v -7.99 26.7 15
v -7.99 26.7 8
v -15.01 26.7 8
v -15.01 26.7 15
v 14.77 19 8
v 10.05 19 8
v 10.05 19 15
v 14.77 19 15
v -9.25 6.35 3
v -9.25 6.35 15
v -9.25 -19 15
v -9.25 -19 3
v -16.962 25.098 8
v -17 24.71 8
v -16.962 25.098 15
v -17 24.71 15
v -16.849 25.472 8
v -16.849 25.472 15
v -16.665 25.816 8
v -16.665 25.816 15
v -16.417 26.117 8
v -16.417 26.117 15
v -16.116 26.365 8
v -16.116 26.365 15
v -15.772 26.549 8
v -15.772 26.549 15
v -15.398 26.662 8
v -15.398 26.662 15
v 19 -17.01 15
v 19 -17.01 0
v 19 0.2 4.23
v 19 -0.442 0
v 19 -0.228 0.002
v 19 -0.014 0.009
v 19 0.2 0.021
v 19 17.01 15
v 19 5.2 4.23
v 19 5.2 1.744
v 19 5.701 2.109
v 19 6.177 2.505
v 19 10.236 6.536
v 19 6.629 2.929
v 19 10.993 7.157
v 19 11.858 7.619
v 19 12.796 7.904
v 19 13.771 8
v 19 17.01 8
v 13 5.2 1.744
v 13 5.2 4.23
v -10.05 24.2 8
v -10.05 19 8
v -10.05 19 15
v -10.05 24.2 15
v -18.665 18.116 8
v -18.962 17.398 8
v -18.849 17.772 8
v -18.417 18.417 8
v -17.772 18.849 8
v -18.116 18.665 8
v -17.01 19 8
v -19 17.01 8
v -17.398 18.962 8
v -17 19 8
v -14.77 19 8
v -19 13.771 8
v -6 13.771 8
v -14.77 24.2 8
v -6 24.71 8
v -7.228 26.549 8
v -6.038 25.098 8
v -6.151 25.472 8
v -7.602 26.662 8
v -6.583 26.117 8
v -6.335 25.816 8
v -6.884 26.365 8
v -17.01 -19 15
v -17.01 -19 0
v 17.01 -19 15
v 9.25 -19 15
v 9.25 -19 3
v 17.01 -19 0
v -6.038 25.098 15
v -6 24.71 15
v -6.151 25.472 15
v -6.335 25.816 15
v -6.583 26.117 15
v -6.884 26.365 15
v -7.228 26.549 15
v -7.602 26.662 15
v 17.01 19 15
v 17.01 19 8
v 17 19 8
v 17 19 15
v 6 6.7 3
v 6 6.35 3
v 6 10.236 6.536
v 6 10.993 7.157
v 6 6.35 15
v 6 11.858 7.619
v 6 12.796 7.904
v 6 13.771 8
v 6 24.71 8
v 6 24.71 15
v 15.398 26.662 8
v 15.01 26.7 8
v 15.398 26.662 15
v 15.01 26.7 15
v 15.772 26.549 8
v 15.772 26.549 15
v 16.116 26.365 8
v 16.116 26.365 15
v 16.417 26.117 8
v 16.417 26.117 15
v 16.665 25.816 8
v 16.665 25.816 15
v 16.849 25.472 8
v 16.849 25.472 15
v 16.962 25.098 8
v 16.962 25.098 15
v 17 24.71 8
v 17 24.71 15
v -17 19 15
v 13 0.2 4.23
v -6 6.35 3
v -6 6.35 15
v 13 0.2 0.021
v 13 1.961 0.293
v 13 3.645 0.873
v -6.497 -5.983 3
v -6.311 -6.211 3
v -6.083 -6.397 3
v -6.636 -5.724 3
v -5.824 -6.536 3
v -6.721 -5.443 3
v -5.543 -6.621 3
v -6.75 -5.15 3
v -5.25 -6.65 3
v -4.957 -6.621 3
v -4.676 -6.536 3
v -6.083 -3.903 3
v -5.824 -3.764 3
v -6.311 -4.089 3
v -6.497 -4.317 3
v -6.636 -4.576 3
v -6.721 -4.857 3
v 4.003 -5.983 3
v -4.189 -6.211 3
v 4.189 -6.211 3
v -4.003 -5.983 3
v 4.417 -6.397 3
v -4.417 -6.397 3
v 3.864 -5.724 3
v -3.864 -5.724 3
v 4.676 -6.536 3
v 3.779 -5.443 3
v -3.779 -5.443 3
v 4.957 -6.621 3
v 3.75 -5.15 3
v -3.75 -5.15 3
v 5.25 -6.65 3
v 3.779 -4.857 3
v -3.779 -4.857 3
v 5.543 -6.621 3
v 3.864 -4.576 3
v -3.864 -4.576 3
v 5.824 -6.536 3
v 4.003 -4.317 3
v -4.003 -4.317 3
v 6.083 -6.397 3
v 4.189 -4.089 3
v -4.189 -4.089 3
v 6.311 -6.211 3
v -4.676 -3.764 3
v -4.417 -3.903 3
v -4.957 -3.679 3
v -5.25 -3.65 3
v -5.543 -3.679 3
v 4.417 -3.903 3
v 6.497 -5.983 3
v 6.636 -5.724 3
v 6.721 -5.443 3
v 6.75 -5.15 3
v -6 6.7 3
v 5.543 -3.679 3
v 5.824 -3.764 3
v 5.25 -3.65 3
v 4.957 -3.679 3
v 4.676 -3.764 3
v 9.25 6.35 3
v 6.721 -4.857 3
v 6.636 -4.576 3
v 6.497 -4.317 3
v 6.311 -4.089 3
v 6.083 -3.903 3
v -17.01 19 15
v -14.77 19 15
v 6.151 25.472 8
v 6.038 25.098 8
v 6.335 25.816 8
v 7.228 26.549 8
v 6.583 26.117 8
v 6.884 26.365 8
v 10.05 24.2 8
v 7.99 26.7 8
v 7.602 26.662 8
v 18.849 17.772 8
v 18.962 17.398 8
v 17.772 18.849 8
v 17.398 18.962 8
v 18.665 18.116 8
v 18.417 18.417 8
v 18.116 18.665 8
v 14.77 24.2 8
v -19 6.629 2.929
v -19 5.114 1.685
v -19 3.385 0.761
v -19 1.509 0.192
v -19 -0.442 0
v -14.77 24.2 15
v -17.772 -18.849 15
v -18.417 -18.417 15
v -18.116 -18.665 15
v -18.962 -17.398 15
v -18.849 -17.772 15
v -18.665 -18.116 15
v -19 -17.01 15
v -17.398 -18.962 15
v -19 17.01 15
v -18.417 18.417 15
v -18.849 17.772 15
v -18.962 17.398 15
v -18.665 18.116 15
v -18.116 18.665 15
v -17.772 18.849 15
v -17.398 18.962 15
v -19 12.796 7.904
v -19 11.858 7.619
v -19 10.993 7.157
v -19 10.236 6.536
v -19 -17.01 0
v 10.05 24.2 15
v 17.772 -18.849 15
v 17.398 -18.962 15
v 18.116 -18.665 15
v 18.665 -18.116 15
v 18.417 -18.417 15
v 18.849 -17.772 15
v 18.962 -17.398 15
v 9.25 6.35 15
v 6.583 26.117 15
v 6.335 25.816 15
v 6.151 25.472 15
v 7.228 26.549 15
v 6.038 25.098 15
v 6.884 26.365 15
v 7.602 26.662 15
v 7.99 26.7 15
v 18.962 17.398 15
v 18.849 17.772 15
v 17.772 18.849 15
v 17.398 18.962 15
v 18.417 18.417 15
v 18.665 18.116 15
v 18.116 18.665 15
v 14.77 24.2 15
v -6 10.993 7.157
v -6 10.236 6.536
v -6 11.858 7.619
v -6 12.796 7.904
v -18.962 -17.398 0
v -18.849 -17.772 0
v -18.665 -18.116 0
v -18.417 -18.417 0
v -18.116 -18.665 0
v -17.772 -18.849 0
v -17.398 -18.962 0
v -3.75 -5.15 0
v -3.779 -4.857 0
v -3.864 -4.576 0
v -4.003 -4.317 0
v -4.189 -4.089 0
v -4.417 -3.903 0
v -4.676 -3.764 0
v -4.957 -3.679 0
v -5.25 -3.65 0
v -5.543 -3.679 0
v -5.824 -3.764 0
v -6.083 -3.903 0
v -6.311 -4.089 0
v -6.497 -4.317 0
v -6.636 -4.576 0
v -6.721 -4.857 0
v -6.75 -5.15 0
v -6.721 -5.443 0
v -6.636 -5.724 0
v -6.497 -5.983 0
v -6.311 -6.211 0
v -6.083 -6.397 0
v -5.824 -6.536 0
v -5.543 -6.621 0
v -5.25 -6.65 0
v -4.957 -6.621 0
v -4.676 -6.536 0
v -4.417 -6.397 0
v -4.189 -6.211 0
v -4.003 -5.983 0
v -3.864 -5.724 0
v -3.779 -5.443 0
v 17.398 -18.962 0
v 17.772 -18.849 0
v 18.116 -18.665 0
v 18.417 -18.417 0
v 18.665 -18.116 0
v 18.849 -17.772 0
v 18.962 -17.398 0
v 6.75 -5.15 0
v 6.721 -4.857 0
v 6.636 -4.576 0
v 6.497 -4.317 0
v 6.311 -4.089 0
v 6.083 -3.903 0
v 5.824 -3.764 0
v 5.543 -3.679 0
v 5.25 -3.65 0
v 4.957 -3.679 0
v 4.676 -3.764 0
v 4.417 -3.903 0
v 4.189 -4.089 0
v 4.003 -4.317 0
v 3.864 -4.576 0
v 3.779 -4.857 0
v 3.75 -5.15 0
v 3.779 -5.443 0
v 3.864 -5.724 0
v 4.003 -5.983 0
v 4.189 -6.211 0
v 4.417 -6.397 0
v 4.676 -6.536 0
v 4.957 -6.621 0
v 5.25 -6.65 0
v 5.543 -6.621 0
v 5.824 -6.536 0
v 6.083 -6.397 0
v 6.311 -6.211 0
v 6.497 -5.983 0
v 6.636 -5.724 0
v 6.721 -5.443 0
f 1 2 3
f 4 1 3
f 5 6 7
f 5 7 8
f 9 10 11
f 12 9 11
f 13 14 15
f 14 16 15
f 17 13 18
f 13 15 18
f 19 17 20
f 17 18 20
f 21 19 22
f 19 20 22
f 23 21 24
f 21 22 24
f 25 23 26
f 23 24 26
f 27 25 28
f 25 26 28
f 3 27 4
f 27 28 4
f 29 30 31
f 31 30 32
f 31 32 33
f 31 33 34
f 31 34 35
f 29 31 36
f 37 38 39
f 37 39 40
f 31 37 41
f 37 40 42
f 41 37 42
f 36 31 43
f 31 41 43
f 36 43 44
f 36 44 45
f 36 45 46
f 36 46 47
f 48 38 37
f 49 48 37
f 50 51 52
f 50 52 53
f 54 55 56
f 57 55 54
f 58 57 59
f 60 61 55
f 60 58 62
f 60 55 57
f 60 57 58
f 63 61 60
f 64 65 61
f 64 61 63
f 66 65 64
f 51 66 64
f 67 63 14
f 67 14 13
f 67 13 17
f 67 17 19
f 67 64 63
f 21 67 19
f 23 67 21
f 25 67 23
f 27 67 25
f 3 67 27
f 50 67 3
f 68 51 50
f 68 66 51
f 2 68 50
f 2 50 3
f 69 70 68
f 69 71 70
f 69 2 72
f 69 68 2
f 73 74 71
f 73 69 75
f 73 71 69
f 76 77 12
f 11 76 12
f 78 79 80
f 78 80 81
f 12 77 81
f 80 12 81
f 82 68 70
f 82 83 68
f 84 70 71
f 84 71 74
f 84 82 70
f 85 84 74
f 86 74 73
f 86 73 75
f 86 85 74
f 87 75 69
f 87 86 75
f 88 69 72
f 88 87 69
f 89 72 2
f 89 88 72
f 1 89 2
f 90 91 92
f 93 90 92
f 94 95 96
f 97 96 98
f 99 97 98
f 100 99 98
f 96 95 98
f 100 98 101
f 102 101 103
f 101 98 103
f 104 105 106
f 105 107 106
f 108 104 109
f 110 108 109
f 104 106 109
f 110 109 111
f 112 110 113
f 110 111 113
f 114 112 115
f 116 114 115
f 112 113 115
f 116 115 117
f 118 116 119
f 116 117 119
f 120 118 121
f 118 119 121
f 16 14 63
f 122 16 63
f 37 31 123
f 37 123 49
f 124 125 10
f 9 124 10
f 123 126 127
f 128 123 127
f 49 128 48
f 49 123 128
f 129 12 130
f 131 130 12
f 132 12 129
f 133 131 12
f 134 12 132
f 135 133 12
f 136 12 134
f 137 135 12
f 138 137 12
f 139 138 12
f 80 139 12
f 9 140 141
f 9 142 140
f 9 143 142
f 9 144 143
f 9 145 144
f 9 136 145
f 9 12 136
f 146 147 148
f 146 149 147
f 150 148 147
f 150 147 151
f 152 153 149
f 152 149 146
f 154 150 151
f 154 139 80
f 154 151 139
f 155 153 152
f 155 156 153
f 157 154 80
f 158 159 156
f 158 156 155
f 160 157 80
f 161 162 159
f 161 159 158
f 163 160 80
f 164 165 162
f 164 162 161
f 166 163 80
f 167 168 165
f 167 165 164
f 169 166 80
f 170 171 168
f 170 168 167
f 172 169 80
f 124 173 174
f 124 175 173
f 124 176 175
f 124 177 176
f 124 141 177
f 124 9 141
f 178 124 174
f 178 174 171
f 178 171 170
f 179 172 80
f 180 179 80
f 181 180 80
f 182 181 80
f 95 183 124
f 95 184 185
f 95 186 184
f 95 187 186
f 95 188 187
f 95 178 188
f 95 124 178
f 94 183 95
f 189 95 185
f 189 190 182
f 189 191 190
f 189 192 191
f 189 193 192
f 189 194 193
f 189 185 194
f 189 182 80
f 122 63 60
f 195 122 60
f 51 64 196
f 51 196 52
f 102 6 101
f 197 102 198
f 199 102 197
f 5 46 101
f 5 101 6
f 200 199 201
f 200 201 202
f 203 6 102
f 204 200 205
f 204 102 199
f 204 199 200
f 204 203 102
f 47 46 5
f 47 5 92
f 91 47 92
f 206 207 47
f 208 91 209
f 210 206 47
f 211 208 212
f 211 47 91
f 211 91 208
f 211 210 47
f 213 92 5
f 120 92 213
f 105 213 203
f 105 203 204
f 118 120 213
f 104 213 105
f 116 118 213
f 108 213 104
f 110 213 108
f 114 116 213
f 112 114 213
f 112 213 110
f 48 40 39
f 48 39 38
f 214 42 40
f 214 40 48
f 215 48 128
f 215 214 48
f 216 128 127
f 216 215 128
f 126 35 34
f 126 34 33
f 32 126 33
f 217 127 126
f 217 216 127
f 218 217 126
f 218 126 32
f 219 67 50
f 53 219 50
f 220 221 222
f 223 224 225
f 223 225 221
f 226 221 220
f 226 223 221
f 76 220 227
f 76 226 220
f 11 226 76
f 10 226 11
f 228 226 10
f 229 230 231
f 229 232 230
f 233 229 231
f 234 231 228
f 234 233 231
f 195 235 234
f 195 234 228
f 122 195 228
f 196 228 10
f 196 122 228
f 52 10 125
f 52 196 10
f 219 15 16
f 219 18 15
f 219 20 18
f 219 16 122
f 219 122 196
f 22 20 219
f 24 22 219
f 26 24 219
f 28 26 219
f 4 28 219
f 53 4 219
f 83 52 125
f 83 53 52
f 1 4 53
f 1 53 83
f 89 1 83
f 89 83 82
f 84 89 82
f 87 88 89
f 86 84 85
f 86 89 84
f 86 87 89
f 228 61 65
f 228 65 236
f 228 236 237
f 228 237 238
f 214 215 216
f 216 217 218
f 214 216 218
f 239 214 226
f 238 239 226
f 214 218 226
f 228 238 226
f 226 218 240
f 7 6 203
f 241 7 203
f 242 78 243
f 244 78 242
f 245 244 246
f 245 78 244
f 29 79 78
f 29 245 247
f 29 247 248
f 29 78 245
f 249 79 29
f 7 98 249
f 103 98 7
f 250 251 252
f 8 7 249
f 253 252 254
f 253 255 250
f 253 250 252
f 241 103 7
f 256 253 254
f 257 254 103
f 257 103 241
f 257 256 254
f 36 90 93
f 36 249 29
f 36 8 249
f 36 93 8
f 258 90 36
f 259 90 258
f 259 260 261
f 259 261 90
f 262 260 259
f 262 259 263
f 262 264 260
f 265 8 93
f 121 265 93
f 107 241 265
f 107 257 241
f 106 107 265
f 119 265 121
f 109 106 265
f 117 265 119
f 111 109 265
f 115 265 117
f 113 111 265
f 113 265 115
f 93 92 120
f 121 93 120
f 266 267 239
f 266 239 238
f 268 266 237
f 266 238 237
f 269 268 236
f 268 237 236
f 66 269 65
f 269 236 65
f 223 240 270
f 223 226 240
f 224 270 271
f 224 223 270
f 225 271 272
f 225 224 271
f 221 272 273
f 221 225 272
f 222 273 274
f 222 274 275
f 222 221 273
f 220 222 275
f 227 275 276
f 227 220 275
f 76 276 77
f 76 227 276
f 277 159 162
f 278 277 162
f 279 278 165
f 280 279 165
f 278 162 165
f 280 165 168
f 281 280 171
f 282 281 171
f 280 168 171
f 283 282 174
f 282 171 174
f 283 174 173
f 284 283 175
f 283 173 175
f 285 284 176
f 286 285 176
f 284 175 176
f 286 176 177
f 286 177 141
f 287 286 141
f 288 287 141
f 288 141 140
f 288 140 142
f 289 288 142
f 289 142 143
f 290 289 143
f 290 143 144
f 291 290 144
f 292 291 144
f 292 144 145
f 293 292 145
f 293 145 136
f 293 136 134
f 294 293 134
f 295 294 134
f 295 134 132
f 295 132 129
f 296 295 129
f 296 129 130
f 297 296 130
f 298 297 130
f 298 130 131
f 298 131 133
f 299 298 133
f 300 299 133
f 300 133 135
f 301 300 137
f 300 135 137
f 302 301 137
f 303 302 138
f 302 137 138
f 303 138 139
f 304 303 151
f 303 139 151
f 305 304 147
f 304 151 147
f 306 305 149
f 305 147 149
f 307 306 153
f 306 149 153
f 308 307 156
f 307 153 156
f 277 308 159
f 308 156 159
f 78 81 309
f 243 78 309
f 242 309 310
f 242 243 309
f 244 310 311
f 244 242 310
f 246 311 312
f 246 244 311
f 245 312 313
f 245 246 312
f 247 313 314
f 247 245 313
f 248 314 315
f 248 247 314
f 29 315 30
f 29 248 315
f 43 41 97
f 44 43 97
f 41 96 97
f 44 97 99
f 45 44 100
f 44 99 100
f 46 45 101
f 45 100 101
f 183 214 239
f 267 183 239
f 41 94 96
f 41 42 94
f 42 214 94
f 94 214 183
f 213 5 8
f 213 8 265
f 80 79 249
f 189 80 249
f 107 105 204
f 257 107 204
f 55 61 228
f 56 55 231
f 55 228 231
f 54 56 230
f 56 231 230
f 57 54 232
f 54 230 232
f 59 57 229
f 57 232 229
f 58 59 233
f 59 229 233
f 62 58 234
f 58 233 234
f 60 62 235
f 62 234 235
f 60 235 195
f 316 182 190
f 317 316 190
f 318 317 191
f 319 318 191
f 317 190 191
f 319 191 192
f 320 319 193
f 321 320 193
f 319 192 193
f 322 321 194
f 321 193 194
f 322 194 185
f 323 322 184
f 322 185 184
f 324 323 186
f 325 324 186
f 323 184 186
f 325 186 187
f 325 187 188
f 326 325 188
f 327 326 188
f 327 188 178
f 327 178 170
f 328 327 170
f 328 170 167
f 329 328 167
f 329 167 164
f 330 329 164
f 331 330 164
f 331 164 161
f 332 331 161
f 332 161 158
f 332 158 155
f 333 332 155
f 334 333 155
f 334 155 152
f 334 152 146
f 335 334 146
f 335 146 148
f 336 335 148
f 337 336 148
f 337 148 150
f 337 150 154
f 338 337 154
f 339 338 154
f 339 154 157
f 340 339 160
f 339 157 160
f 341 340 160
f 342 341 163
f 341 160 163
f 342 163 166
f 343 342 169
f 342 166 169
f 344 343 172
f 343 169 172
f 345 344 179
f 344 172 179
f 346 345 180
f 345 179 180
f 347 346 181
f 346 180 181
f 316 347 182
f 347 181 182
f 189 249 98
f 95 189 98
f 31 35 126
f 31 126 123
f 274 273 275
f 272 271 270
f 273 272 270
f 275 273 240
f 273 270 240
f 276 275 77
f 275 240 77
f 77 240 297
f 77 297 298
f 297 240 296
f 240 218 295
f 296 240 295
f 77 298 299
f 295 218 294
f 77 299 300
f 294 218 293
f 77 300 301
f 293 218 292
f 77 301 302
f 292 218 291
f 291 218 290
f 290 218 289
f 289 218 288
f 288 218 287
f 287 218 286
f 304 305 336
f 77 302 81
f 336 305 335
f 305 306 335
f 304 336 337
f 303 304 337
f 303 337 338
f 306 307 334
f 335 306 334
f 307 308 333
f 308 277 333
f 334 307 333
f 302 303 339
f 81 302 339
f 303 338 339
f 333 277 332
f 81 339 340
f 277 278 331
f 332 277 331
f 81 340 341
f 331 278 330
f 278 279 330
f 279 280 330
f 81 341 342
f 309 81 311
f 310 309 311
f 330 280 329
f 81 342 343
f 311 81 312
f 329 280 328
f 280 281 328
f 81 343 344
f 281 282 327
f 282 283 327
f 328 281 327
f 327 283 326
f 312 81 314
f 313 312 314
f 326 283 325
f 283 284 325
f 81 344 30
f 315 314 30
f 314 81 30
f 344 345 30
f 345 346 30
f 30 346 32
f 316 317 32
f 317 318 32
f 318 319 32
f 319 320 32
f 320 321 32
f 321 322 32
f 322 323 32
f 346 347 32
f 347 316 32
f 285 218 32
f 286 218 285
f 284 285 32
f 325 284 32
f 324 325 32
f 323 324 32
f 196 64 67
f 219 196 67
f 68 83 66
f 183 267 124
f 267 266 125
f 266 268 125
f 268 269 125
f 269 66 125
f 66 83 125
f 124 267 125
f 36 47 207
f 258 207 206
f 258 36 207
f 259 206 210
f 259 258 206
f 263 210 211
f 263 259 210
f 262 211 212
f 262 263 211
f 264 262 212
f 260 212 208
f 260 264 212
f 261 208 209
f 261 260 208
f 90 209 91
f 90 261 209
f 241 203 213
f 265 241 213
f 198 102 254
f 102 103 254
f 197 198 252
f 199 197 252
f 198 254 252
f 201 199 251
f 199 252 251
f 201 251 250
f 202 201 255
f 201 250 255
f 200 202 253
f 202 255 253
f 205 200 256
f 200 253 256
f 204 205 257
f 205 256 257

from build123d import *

# Parameters (mm, degrees)
SKETCH_W        = 4.72
SKETCH_H        = 5.2
PAD_DEPTH       = 15
POCKET_DEPTH    = 38.001
POCKET005_DEPTH = 12
SKETCH003_R     = 1.5
POCKET006_DEPTH = 5
FILLET_R        = 1.99
FILLET001_R     = 10
FILLET002_R     = 5
SKETCH004_W     = 5
SKETCH004_H     = 4.23039
POCKET007_DEPTH = 6


with BuildPart() as part:
    # Sketch → Pad (new body)
    with BuildSketch(Plane.XY):
        Polygon((-19, 19), (-19, -19), (19, -19), (19, 19), (17, 19), (17, 26.7), (6, 26.7), (6, 19), (-6, 19), (-6, 26.7), (-17, 26.7), (-17, 19), align=None)
        with Locations((-12.41, 21.6)):
            Rectangle(SKETCH_W, SKETCH_H, mode=Mode.SUBTRACT)
        with Locations((12.41, 21.6)):
            Rectangle(SKETCH_W, SKETCH_H, mode=Mode.SUBTRACT)
    extrude(amount=PAD_DEPTH)

    # Sketch001 (on Face3 of Pad) → Pocket (cut, through all)
    with BuildSketch(Plane.YZ.offset(19)):
        Polygon((26.7, 8), (26.7, 0), (3.7, 0), (11.7, 8), align=None)
    extrude(amount=-POCKET_DEPTH, mode=Mode.SUBTRACT)

    # Sketch002 (on Face6 of Pocket) → Pocket005 (cut)
    with BuildSketch(Plane.XY.offset(15)):
        Polygon((-9.25, -19), (9.25, -19), (9.25, 6.35), (6, 6.35), (6, 19), (-6, 19), (-6, 6.35), (-9.25, 6.35), align=None)
    extrude(amount=-POCKET005_DEPTH, mode=Mode.SUBTRACT)

    # Sketch003 → Pocket006 (cut)
    with BuildSketch(Plane.XY.offset(4)):
        with Locations((-5.25, -5.15)):
            Circle(SKETCH003_R)
        with Locations((5.25, -5.15)):
            Circle(SKETCH003_R)
    extrude(amount=-POCKET006_DEPTH, mode=Mode.SUBTRACT)

    # Fillet
    fillet_edges = [part.edges().sort_by_distance(p)[0] for p in [
        (17, 26.7, 11.5),
        (6, 26.7, 11.5),
        (-6, 26.7, 11.5),
        (-17, 26.7, 11.5),
        (-19, 19, 11.5),
        (19, 19, 11.5),
        (19, -19, 7.5),
        (-19, -19, 7.5),
    ]]
    fillet(fillet_edges, radius=FILLET_R)

    # Fillet001
    fillet001_edges = [part.edges().sort_by_distance(p)[0] for p in [
        (0, 3.7, 0),
    ]]
    fillet(fillet001_edges, radius=FILLET001_R)

    # Fillet002
    fillet002_edges = [part.edges().sort_by_distance(p)[0] for p in [
        (12.5, 11.7, 8),
        (-12.5, 11.7, 8),
    ]]
    fillet(fillet002_edges, radius=FILLET002_R)

    # Sketch004 (on Face10 of Fillet002) → Pocket007 (cut)
    with BuildSketch(Plane.YZ.offset(19)):
        with Locations((2.7, 2.115195)):
            Rectangle(SKETCH004_W, SKETCH004_H)
    extrude(amount=-POCKET007_DEPTH, mode=Mode.SUBTRACT)


solid = part.part
